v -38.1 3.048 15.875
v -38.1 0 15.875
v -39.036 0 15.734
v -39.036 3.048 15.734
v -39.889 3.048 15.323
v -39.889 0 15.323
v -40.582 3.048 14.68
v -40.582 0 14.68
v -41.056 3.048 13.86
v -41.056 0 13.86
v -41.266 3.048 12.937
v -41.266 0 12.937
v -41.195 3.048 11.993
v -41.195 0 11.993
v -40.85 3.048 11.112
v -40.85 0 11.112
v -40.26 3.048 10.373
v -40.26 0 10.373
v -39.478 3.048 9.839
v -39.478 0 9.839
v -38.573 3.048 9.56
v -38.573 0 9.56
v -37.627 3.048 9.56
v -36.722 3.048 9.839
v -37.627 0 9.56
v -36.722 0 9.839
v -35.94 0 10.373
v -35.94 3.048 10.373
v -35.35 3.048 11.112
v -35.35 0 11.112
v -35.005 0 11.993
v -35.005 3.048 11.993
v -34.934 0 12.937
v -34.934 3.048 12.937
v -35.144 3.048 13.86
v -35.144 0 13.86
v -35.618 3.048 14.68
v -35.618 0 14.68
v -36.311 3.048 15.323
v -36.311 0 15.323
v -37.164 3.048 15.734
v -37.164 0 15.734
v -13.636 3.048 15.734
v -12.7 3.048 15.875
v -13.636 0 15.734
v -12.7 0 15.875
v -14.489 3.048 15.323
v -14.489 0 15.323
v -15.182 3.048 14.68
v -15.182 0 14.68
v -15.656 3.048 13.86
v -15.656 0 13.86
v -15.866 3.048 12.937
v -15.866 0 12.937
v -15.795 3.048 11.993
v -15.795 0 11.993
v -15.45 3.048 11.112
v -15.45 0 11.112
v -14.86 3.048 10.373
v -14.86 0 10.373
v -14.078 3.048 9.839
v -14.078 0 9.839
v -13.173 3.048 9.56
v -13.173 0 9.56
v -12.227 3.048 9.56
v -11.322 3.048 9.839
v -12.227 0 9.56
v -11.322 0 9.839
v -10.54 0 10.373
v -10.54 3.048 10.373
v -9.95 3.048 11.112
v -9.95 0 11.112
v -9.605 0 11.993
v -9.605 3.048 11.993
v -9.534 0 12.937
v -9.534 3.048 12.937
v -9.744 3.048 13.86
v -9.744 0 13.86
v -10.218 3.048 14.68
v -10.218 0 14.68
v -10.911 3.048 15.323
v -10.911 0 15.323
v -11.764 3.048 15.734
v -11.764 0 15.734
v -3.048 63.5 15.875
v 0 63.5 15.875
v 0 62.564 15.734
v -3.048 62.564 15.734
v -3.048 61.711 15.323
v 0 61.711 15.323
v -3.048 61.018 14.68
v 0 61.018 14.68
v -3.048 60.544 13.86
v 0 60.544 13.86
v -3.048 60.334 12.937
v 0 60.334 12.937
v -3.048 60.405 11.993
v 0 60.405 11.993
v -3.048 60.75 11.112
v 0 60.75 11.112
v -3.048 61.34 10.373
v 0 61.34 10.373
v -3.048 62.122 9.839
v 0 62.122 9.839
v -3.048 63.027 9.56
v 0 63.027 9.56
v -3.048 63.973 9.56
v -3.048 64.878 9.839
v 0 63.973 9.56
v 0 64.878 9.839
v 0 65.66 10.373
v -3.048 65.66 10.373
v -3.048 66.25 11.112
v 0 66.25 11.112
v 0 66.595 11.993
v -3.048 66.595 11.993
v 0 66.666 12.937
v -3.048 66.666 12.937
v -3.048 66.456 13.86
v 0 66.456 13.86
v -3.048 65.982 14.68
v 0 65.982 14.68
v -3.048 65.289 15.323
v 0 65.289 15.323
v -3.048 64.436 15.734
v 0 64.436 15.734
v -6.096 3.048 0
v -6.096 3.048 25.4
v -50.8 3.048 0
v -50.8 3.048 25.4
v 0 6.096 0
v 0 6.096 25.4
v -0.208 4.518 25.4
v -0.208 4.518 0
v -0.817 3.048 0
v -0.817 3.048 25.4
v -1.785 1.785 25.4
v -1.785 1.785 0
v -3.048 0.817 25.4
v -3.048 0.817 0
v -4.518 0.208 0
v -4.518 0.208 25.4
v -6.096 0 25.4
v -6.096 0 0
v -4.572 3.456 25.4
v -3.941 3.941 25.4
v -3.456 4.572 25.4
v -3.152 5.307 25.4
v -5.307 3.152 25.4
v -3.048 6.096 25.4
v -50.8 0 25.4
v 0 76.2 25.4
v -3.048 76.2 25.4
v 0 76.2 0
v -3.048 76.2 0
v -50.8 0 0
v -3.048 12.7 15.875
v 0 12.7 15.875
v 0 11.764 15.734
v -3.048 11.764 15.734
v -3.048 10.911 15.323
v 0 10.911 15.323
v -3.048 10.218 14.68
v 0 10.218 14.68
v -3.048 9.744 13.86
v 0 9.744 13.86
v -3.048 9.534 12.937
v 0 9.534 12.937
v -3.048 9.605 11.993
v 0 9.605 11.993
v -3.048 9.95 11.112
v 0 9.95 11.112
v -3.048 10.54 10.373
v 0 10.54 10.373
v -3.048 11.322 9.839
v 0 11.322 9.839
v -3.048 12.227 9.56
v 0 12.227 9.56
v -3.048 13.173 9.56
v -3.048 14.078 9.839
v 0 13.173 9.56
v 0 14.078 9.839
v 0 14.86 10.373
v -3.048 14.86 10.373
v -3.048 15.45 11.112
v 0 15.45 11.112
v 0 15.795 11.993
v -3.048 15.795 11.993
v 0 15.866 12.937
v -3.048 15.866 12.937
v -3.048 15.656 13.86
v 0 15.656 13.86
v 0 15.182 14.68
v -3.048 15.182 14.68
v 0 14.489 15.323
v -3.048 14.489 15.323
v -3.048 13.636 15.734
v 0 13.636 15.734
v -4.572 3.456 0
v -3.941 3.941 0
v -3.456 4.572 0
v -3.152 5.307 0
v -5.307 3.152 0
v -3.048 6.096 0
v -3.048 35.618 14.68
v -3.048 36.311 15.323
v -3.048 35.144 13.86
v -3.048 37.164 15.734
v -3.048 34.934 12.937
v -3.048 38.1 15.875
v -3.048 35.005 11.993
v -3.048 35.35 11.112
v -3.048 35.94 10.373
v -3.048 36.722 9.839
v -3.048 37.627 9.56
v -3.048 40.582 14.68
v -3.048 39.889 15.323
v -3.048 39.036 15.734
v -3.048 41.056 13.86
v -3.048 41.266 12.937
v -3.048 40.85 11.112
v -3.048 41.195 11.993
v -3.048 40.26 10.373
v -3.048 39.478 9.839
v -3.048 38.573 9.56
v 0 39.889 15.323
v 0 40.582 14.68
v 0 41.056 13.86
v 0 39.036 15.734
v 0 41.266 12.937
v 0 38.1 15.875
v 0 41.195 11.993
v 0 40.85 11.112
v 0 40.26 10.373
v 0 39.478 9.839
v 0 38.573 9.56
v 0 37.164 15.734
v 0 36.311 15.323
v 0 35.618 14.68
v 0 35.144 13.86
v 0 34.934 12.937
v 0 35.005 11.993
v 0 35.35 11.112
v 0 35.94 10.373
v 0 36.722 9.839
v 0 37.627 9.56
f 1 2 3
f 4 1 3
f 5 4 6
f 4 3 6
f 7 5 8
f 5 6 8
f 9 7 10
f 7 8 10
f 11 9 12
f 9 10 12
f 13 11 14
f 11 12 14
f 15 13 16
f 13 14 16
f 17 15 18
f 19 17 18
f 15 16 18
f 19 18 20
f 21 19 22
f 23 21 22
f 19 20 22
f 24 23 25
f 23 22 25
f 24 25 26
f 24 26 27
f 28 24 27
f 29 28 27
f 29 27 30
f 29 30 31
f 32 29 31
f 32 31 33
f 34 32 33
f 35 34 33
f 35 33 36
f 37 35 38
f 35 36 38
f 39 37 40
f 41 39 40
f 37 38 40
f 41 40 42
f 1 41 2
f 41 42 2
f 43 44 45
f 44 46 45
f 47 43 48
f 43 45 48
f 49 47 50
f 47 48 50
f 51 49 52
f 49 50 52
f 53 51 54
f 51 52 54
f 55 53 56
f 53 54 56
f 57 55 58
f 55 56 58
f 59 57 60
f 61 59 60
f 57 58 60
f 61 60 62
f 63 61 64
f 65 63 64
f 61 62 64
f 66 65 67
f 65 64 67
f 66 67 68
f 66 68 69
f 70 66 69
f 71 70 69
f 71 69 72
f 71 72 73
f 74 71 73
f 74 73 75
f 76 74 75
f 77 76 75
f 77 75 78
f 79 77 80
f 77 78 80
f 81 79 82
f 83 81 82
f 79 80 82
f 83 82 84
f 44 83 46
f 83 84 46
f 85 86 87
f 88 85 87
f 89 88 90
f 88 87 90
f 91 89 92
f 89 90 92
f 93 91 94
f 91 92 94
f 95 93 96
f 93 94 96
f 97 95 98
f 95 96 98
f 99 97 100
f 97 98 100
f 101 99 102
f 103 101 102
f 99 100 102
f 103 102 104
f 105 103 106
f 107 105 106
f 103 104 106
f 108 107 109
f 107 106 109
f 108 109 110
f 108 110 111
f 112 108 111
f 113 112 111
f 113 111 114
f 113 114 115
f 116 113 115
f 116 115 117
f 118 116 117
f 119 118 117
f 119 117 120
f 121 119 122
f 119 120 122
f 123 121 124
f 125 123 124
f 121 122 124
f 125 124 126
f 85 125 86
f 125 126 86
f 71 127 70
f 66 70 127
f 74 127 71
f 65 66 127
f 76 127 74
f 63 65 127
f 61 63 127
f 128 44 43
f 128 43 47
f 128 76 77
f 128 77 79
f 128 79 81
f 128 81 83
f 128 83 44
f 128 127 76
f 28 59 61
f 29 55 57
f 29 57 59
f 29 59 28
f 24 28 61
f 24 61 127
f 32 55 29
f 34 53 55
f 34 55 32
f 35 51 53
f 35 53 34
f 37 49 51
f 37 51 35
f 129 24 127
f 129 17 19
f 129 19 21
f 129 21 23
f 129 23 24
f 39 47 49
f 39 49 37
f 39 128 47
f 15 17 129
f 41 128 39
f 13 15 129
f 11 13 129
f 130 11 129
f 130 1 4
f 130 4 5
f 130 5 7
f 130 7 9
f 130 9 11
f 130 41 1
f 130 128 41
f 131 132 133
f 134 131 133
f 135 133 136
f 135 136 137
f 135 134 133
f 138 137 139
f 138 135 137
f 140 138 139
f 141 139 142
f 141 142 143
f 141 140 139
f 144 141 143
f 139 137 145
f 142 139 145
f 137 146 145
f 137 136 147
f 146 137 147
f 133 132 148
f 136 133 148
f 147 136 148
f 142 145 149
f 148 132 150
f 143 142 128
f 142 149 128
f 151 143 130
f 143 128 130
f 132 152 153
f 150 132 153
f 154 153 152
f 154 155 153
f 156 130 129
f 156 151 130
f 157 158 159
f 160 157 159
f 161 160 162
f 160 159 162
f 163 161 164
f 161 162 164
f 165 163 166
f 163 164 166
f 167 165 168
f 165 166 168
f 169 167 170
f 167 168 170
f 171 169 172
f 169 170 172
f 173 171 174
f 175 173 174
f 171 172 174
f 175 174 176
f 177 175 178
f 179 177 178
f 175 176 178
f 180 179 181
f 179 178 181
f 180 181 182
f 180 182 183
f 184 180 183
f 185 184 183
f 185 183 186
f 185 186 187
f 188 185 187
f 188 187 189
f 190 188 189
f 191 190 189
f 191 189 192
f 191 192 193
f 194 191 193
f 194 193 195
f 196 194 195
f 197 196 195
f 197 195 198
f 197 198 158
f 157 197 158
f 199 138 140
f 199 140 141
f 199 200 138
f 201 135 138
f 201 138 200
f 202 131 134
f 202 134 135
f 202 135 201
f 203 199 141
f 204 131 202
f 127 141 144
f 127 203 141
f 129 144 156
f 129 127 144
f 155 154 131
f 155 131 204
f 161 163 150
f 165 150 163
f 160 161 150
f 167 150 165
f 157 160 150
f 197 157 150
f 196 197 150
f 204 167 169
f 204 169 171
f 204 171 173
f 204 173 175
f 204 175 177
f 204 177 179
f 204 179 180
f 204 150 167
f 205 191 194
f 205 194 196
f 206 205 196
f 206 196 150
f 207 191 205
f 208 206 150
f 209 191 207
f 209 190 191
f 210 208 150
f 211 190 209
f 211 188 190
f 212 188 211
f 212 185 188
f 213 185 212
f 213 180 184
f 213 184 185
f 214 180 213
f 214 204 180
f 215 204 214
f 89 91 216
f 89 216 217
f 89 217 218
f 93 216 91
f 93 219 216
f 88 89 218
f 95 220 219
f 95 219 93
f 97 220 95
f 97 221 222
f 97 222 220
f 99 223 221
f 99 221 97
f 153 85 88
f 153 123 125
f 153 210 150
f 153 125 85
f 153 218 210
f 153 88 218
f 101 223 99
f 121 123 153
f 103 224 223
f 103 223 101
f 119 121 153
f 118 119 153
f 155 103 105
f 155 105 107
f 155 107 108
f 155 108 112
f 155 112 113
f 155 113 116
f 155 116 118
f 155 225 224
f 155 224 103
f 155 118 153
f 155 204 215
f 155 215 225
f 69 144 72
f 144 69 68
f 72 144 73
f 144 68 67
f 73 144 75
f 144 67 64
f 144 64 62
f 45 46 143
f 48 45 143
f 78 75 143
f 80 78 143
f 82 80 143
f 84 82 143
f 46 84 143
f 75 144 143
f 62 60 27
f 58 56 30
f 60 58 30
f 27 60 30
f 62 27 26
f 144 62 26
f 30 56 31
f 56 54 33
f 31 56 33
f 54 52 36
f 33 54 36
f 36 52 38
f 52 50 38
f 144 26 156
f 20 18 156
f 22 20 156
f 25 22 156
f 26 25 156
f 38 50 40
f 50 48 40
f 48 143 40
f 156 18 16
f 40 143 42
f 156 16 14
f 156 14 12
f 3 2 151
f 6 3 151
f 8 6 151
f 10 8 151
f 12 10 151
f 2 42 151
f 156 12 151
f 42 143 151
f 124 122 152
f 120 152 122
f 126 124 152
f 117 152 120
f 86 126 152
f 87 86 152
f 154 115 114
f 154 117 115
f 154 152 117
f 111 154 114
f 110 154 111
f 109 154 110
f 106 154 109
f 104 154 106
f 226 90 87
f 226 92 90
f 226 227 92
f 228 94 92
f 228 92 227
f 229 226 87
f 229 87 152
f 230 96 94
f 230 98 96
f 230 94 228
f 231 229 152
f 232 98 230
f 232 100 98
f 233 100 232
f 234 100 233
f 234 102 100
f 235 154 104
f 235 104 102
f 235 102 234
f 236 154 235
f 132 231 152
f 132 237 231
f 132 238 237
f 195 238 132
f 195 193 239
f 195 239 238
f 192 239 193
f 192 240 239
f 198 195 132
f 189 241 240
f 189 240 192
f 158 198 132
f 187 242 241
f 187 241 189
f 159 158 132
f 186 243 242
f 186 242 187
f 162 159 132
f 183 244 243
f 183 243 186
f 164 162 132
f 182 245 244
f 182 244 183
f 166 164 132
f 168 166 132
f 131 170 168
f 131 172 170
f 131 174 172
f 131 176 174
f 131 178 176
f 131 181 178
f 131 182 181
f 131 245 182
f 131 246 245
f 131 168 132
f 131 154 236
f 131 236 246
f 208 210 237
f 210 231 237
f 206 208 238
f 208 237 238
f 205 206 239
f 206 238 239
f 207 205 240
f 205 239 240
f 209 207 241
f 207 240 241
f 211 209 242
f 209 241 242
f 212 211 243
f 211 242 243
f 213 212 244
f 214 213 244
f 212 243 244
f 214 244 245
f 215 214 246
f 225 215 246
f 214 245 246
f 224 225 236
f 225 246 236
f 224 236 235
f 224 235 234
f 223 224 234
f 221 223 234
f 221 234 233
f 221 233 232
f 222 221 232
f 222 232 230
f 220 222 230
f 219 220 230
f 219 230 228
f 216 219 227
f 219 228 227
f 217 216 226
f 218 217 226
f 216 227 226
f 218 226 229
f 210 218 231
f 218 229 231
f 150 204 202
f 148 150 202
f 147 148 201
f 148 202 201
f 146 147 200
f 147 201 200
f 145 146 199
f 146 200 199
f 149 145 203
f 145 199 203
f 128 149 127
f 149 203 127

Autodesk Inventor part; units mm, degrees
ref_plane "YZ Plane" through (0, 0, 0) normal (1, 0, 0) x (0, 1, 0)
ref_plane "XZ Plane" through (0, 0, 0) normal (0, 1, 0) x (-1, 0, 0)
ref_plane "XY Plane" through (0, 0, 0) normal (0, 0, 1) x (1, 0, 0)
sketch "Sketch1" plane through (0, 0, 0) normal (0, 1, 0) x (-1, 0, 0)
  line L0 (0, 0) -> (0, 25.4)
  line L1 (0, 25.4) -> (50.8, 25.4)
  line L2 (50.8, 25.4) -> (50.8, 0)
  line L3 (50.8, 0) -> (0, 0)
  dimension "d0" = 25.4
  dimension "d1" = 50.8
extrude "Plate1" add sketch "Sketch1" along normal blind 3.048
sketch "Sketch2" plane through (-3.048, 0, 0) normal (1, 0, 0) x (0, 1, 0)
  line L0 (0, 25.4) -> (0, 0)
  line L1 (0, 0) -> (76.2, 0)
  line L2 (76.2, 0) -> (76.2, 25.4)
  line L3 (76.2, 25.4) -> (0, 25.4)
edge flange "Flange1" height 76.2 angle 90 thickness 3.048 bend radius 3.048 thickness toward (1, 0, 0) relief tear relief width 3.048 relief depth 1.524 edges at (0, 3.048, 12.7) wall of the first edge with corners at (-3.048, 0, 25.4) (-3.048, 0, 0) (-3.048, 76.2, 0) (-3.048, 76.2, 25.4)
bend "Bend1"
corner "Corner1"
hole "Hole1" at (-3.048, 12.7, 12.7) direction (1, 0, 0) diameter 6.35 end through all
pattern_linear "Rectangular Pattern1" count 3 spacing 25.4 along (0, 1, 0) of "Hole1"
hole "Hole2" at (-12.7, 3.048, 12.7) direction (0, -1, 0) diameter 6.35 end through all
pattern_linear "Rectangular Pattern2" count 2 spacing 25.4 along (-1, 0, 0) of "Hole2"
equation "\"d20\" = Thickness"
equation "\"d32\" = Thickness"
equation "\"d3\" = BendReliefWidth"
equation "\"d4\" = BendReliefDepth"
equation "\"d5\" = MinimumRemnant"
equation "\"d6\" = BendRadius"
equation "\"d9\" = BendRadius"
equation "\"d10\" = CornerReliefSize"
equation "\"d11\" = GapSize"
equation "\"d12\" = JacobiRadiusSize"
equation "\"BendRadius\" = Thickness"
equation "\"BendReliefWidth\" = Thickness"
equation "\"BendReliefDepth\" = 0.5 * Thickness"
equation "\"CornerReliefSize\" = 4 * Thickness"
equation "\"MinimumRemnant\" = 2 * Thickness"
equation "\"TransitionRadius\" = BendRadius"
equation "\"JacobiRadiusSize\" = BendRadius"
equation "\"GapSize\" = Thickness"
equation "\"d2\" = BendRadius"
equation "\"Thickness\" = 3.048"
properties part number "L-Gusset Steel Plate"
